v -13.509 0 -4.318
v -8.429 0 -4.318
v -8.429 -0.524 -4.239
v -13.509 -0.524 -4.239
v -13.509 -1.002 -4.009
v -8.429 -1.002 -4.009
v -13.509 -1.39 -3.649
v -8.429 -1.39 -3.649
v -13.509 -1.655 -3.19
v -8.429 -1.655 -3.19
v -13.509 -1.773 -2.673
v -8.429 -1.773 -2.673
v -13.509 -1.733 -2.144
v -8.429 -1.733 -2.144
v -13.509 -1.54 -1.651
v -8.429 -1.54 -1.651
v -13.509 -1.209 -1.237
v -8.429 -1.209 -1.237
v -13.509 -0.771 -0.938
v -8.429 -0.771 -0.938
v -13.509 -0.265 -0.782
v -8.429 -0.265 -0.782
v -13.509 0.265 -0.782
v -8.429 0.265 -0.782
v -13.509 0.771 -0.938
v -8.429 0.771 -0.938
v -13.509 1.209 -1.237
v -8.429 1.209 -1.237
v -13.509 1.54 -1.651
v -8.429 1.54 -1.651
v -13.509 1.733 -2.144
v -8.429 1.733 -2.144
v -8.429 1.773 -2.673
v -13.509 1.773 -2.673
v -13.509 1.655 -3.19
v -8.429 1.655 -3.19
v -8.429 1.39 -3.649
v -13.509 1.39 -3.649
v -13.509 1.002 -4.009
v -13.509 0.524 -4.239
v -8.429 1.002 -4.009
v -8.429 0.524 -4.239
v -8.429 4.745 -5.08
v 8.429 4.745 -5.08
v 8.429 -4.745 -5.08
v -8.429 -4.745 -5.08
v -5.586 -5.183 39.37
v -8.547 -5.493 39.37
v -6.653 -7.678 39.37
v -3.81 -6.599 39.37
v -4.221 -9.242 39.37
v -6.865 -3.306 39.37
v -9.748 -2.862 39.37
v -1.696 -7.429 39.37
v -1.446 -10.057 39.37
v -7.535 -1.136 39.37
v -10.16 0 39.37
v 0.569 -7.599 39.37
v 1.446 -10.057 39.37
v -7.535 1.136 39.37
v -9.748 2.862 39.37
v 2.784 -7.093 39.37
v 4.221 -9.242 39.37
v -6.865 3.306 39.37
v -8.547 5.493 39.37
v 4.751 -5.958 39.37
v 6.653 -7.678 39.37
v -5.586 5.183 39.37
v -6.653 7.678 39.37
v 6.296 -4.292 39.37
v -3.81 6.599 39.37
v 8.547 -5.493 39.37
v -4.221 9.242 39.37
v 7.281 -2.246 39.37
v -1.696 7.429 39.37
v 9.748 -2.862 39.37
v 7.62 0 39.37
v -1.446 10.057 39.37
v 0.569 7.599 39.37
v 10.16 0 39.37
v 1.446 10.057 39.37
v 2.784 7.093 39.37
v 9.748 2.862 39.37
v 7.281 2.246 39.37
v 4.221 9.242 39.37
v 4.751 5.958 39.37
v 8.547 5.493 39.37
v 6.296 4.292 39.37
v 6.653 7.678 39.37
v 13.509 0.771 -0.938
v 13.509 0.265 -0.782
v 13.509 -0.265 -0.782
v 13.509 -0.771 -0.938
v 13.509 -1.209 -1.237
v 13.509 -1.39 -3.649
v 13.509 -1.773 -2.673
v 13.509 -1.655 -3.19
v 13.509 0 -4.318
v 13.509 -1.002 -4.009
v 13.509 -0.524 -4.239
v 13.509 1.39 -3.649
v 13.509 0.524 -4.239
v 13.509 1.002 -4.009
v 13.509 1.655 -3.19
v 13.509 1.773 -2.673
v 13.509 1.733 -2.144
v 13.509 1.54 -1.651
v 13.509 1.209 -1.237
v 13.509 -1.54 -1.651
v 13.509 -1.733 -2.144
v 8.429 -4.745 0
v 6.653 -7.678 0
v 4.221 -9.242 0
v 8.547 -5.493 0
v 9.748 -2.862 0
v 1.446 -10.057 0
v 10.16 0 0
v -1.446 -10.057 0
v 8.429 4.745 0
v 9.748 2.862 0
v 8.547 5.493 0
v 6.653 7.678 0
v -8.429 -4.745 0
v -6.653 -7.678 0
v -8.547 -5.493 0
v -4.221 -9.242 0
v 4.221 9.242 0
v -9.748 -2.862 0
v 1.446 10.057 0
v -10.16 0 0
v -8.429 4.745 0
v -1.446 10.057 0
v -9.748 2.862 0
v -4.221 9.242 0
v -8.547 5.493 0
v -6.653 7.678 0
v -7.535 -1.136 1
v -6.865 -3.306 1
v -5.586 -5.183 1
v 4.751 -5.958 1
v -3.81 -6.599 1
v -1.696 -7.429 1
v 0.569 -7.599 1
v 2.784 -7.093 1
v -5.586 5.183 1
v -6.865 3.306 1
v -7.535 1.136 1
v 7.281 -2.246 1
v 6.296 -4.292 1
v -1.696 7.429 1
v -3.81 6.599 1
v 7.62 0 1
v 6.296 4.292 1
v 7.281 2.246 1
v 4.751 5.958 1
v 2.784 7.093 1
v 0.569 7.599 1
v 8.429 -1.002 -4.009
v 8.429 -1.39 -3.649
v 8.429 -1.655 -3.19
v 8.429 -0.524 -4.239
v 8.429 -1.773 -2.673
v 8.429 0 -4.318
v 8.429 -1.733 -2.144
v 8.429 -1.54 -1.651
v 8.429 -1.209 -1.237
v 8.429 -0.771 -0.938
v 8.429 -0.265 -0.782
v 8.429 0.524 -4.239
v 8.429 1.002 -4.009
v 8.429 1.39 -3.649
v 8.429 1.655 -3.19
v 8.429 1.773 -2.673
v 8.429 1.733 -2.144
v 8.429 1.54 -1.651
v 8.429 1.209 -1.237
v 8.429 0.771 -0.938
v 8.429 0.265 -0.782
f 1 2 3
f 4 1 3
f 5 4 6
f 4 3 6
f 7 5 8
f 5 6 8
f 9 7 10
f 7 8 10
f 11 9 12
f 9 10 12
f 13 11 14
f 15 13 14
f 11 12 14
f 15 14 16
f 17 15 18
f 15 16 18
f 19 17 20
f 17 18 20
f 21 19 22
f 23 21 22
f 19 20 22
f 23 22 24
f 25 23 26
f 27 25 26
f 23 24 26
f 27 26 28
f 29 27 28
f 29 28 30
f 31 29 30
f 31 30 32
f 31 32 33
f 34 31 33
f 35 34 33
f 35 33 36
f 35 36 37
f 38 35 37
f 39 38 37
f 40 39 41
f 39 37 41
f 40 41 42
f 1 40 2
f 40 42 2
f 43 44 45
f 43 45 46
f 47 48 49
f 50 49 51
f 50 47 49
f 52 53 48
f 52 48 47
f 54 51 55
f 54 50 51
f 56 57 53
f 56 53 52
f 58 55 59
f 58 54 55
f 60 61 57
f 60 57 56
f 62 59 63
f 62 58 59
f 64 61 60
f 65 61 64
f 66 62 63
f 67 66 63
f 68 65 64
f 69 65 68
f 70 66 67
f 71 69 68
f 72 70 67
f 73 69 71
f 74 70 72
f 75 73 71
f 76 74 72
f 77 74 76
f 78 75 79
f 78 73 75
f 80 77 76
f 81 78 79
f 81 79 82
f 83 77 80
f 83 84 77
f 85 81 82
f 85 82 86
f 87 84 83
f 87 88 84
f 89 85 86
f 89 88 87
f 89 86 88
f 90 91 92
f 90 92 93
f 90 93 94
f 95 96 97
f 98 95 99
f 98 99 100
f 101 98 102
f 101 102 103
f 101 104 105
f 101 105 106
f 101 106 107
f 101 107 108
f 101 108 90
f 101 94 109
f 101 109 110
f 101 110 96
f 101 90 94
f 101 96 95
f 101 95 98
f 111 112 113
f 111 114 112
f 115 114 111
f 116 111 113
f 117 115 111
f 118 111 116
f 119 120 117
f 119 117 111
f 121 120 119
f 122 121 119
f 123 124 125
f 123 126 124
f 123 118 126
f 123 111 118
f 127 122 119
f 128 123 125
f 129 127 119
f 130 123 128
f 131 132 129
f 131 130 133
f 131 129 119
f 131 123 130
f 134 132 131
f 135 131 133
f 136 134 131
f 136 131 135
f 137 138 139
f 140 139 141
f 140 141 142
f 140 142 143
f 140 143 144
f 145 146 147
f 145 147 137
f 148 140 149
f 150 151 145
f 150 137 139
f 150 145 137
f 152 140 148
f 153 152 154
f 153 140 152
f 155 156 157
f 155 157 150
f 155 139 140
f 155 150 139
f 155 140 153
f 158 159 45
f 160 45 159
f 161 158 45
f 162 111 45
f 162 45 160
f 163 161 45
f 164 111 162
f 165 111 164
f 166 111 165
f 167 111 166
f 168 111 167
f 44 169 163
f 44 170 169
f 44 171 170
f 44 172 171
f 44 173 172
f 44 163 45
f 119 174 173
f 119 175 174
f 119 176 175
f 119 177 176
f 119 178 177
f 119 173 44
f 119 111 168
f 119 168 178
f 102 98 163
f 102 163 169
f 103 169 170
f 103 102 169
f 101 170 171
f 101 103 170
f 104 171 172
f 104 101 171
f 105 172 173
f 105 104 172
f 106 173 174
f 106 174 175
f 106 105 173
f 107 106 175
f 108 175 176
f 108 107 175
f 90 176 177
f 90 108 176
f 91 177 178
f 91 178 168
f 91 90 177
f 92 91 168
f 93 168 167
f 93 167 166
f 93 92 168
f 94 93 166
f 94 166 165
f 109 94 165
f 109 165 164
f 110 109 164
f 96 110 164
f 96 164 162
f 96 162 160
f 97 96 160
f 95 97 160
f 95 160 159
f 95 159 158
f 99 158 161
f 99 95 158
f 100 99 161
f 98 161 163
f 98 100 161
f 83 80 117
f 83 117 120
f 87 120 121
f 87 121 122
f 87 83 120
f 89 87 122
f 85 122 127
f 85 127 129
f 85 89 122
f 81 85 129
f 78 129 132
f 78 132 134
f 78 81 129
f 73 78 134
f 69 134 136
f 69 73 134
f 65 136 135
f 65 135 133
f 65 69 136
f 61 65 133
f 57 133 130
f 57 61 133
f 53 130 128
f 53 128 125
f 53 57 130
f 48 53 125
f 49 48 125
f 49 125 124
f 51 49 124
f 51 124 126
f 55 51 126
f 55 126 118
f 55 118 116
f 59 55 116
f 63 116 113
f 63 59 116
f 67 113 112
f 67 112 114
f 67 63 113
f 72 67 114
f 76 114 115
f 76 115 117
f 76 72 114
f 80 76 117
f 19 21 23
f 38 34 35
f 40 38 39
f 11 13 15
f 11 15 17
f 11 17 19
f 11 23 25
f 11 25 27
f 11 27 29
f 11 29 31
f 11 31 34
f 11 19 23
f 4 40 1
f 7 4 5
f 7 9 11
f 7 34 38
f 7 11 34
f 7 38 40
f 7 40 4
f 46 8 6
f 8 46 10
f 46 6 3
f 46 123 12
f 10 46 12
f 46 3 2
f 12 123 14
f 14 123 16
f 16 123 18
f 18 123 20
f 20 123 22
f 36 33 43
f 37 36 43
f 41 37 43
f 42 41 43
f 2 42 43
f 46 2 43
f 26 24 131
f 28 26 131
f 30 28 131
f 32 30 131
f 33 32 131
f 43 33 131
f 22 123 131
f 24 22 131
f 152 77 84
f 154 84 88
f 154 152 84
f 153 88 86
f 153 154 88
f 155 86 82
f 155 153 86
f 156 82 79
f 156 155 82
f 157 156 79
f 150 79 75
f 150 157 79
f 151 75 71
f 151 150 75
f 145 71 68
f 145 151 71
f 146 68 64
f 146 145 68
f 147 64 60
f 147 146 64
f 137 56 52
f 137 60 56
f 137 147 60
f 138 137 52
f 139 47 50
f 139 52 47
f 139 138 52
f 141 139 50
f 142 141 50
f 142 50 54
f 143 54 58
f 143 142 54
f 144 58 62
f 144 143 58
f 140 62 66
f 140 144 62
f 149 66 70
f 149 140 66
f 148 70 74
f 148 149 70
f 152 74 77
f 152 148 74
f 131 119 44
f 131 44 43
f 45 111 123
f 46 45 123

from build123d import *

# Parameters (mm, degrees)
SKETCH2_R           = 10.674295377
CUT_EXTRUDE1_DEPTH  = 1.27
SKETCH3_W           = 16.858270558
SKETCH3_H           = 9.490145314
BOSS_EXTRUDE1_DEPTH = 5.08
SKETCH4_R           = 1.778
BOSS_EXTRUDE2_DEPTH = 5.08
BOSS_EXTRUDE3_START = 5.08
SKETCH5_R           = 1.778
BOSS_EXTRUDE3_DEPTH = 5.08


# Read off the part's stored shape, not the designer's step: Extrude-Thin1
with BuildPart() as part:
    # Extrude-Thin1 outline → Extrude-Thin1 (revolve)
    with BuildSketch(Plane.XZ):
        Polygon((10.16, 40.64), (0, 40.64), (0, 39.64), (7.62, 39.64), (7.62, 1), (0, 1), (0, 0), (10.16, 0), align=None)
    revolve(axis=Axis((0, 0, 0), (0, 0, 1)))

    # Sketch2 → Cut-Extrude1 (cut)
    with BuildSketch(Plane.XY.offset(40.64)):
        Circle(SKETCH2_R)
    extrude(amount=-CUT_EXTRUDE1_DEPTH, mode=Mode.SUBTRACT)

    # Sketch3 → Boss-Extrude1 (add)
    with BuildSketch(Plane(origin=(0, 0, 0), x_dir=(-1, 0, 0), z_dir=(0, 0, -1))):
        Rectangle(SKETCH3_W, SKETCH3_H)
    extrude(amount=BOSS_EXTRUDE1_DEPTH)

    # Sketch4 → Boss-Extrude2 (add)
    with BuildSketch(Plane.ZY.offset(8.429135279)):
        with Locations(Location((-2.54, 0, 0), (0, 0, 180))):
            Circle(SKETCH4_R)
    extrude(amount=BOSS_EXTRUDE2_DEPTH)

    # Sketch5 → Boss-Extrude3 (add)
    with BuildSketch(Plane(origin=(8.429135279, 0, 0), x_dir=(0, 0, -1), z_dir=(1, 0, 0)).offset(BOSS_EXTRUDE3_START)):
        with Locations((2.54, 0)):
            Circle(SKETCH5_R)
    extrude(amount=-BOSS_EXTRUDE3_DEPTH)


solid = part.part
